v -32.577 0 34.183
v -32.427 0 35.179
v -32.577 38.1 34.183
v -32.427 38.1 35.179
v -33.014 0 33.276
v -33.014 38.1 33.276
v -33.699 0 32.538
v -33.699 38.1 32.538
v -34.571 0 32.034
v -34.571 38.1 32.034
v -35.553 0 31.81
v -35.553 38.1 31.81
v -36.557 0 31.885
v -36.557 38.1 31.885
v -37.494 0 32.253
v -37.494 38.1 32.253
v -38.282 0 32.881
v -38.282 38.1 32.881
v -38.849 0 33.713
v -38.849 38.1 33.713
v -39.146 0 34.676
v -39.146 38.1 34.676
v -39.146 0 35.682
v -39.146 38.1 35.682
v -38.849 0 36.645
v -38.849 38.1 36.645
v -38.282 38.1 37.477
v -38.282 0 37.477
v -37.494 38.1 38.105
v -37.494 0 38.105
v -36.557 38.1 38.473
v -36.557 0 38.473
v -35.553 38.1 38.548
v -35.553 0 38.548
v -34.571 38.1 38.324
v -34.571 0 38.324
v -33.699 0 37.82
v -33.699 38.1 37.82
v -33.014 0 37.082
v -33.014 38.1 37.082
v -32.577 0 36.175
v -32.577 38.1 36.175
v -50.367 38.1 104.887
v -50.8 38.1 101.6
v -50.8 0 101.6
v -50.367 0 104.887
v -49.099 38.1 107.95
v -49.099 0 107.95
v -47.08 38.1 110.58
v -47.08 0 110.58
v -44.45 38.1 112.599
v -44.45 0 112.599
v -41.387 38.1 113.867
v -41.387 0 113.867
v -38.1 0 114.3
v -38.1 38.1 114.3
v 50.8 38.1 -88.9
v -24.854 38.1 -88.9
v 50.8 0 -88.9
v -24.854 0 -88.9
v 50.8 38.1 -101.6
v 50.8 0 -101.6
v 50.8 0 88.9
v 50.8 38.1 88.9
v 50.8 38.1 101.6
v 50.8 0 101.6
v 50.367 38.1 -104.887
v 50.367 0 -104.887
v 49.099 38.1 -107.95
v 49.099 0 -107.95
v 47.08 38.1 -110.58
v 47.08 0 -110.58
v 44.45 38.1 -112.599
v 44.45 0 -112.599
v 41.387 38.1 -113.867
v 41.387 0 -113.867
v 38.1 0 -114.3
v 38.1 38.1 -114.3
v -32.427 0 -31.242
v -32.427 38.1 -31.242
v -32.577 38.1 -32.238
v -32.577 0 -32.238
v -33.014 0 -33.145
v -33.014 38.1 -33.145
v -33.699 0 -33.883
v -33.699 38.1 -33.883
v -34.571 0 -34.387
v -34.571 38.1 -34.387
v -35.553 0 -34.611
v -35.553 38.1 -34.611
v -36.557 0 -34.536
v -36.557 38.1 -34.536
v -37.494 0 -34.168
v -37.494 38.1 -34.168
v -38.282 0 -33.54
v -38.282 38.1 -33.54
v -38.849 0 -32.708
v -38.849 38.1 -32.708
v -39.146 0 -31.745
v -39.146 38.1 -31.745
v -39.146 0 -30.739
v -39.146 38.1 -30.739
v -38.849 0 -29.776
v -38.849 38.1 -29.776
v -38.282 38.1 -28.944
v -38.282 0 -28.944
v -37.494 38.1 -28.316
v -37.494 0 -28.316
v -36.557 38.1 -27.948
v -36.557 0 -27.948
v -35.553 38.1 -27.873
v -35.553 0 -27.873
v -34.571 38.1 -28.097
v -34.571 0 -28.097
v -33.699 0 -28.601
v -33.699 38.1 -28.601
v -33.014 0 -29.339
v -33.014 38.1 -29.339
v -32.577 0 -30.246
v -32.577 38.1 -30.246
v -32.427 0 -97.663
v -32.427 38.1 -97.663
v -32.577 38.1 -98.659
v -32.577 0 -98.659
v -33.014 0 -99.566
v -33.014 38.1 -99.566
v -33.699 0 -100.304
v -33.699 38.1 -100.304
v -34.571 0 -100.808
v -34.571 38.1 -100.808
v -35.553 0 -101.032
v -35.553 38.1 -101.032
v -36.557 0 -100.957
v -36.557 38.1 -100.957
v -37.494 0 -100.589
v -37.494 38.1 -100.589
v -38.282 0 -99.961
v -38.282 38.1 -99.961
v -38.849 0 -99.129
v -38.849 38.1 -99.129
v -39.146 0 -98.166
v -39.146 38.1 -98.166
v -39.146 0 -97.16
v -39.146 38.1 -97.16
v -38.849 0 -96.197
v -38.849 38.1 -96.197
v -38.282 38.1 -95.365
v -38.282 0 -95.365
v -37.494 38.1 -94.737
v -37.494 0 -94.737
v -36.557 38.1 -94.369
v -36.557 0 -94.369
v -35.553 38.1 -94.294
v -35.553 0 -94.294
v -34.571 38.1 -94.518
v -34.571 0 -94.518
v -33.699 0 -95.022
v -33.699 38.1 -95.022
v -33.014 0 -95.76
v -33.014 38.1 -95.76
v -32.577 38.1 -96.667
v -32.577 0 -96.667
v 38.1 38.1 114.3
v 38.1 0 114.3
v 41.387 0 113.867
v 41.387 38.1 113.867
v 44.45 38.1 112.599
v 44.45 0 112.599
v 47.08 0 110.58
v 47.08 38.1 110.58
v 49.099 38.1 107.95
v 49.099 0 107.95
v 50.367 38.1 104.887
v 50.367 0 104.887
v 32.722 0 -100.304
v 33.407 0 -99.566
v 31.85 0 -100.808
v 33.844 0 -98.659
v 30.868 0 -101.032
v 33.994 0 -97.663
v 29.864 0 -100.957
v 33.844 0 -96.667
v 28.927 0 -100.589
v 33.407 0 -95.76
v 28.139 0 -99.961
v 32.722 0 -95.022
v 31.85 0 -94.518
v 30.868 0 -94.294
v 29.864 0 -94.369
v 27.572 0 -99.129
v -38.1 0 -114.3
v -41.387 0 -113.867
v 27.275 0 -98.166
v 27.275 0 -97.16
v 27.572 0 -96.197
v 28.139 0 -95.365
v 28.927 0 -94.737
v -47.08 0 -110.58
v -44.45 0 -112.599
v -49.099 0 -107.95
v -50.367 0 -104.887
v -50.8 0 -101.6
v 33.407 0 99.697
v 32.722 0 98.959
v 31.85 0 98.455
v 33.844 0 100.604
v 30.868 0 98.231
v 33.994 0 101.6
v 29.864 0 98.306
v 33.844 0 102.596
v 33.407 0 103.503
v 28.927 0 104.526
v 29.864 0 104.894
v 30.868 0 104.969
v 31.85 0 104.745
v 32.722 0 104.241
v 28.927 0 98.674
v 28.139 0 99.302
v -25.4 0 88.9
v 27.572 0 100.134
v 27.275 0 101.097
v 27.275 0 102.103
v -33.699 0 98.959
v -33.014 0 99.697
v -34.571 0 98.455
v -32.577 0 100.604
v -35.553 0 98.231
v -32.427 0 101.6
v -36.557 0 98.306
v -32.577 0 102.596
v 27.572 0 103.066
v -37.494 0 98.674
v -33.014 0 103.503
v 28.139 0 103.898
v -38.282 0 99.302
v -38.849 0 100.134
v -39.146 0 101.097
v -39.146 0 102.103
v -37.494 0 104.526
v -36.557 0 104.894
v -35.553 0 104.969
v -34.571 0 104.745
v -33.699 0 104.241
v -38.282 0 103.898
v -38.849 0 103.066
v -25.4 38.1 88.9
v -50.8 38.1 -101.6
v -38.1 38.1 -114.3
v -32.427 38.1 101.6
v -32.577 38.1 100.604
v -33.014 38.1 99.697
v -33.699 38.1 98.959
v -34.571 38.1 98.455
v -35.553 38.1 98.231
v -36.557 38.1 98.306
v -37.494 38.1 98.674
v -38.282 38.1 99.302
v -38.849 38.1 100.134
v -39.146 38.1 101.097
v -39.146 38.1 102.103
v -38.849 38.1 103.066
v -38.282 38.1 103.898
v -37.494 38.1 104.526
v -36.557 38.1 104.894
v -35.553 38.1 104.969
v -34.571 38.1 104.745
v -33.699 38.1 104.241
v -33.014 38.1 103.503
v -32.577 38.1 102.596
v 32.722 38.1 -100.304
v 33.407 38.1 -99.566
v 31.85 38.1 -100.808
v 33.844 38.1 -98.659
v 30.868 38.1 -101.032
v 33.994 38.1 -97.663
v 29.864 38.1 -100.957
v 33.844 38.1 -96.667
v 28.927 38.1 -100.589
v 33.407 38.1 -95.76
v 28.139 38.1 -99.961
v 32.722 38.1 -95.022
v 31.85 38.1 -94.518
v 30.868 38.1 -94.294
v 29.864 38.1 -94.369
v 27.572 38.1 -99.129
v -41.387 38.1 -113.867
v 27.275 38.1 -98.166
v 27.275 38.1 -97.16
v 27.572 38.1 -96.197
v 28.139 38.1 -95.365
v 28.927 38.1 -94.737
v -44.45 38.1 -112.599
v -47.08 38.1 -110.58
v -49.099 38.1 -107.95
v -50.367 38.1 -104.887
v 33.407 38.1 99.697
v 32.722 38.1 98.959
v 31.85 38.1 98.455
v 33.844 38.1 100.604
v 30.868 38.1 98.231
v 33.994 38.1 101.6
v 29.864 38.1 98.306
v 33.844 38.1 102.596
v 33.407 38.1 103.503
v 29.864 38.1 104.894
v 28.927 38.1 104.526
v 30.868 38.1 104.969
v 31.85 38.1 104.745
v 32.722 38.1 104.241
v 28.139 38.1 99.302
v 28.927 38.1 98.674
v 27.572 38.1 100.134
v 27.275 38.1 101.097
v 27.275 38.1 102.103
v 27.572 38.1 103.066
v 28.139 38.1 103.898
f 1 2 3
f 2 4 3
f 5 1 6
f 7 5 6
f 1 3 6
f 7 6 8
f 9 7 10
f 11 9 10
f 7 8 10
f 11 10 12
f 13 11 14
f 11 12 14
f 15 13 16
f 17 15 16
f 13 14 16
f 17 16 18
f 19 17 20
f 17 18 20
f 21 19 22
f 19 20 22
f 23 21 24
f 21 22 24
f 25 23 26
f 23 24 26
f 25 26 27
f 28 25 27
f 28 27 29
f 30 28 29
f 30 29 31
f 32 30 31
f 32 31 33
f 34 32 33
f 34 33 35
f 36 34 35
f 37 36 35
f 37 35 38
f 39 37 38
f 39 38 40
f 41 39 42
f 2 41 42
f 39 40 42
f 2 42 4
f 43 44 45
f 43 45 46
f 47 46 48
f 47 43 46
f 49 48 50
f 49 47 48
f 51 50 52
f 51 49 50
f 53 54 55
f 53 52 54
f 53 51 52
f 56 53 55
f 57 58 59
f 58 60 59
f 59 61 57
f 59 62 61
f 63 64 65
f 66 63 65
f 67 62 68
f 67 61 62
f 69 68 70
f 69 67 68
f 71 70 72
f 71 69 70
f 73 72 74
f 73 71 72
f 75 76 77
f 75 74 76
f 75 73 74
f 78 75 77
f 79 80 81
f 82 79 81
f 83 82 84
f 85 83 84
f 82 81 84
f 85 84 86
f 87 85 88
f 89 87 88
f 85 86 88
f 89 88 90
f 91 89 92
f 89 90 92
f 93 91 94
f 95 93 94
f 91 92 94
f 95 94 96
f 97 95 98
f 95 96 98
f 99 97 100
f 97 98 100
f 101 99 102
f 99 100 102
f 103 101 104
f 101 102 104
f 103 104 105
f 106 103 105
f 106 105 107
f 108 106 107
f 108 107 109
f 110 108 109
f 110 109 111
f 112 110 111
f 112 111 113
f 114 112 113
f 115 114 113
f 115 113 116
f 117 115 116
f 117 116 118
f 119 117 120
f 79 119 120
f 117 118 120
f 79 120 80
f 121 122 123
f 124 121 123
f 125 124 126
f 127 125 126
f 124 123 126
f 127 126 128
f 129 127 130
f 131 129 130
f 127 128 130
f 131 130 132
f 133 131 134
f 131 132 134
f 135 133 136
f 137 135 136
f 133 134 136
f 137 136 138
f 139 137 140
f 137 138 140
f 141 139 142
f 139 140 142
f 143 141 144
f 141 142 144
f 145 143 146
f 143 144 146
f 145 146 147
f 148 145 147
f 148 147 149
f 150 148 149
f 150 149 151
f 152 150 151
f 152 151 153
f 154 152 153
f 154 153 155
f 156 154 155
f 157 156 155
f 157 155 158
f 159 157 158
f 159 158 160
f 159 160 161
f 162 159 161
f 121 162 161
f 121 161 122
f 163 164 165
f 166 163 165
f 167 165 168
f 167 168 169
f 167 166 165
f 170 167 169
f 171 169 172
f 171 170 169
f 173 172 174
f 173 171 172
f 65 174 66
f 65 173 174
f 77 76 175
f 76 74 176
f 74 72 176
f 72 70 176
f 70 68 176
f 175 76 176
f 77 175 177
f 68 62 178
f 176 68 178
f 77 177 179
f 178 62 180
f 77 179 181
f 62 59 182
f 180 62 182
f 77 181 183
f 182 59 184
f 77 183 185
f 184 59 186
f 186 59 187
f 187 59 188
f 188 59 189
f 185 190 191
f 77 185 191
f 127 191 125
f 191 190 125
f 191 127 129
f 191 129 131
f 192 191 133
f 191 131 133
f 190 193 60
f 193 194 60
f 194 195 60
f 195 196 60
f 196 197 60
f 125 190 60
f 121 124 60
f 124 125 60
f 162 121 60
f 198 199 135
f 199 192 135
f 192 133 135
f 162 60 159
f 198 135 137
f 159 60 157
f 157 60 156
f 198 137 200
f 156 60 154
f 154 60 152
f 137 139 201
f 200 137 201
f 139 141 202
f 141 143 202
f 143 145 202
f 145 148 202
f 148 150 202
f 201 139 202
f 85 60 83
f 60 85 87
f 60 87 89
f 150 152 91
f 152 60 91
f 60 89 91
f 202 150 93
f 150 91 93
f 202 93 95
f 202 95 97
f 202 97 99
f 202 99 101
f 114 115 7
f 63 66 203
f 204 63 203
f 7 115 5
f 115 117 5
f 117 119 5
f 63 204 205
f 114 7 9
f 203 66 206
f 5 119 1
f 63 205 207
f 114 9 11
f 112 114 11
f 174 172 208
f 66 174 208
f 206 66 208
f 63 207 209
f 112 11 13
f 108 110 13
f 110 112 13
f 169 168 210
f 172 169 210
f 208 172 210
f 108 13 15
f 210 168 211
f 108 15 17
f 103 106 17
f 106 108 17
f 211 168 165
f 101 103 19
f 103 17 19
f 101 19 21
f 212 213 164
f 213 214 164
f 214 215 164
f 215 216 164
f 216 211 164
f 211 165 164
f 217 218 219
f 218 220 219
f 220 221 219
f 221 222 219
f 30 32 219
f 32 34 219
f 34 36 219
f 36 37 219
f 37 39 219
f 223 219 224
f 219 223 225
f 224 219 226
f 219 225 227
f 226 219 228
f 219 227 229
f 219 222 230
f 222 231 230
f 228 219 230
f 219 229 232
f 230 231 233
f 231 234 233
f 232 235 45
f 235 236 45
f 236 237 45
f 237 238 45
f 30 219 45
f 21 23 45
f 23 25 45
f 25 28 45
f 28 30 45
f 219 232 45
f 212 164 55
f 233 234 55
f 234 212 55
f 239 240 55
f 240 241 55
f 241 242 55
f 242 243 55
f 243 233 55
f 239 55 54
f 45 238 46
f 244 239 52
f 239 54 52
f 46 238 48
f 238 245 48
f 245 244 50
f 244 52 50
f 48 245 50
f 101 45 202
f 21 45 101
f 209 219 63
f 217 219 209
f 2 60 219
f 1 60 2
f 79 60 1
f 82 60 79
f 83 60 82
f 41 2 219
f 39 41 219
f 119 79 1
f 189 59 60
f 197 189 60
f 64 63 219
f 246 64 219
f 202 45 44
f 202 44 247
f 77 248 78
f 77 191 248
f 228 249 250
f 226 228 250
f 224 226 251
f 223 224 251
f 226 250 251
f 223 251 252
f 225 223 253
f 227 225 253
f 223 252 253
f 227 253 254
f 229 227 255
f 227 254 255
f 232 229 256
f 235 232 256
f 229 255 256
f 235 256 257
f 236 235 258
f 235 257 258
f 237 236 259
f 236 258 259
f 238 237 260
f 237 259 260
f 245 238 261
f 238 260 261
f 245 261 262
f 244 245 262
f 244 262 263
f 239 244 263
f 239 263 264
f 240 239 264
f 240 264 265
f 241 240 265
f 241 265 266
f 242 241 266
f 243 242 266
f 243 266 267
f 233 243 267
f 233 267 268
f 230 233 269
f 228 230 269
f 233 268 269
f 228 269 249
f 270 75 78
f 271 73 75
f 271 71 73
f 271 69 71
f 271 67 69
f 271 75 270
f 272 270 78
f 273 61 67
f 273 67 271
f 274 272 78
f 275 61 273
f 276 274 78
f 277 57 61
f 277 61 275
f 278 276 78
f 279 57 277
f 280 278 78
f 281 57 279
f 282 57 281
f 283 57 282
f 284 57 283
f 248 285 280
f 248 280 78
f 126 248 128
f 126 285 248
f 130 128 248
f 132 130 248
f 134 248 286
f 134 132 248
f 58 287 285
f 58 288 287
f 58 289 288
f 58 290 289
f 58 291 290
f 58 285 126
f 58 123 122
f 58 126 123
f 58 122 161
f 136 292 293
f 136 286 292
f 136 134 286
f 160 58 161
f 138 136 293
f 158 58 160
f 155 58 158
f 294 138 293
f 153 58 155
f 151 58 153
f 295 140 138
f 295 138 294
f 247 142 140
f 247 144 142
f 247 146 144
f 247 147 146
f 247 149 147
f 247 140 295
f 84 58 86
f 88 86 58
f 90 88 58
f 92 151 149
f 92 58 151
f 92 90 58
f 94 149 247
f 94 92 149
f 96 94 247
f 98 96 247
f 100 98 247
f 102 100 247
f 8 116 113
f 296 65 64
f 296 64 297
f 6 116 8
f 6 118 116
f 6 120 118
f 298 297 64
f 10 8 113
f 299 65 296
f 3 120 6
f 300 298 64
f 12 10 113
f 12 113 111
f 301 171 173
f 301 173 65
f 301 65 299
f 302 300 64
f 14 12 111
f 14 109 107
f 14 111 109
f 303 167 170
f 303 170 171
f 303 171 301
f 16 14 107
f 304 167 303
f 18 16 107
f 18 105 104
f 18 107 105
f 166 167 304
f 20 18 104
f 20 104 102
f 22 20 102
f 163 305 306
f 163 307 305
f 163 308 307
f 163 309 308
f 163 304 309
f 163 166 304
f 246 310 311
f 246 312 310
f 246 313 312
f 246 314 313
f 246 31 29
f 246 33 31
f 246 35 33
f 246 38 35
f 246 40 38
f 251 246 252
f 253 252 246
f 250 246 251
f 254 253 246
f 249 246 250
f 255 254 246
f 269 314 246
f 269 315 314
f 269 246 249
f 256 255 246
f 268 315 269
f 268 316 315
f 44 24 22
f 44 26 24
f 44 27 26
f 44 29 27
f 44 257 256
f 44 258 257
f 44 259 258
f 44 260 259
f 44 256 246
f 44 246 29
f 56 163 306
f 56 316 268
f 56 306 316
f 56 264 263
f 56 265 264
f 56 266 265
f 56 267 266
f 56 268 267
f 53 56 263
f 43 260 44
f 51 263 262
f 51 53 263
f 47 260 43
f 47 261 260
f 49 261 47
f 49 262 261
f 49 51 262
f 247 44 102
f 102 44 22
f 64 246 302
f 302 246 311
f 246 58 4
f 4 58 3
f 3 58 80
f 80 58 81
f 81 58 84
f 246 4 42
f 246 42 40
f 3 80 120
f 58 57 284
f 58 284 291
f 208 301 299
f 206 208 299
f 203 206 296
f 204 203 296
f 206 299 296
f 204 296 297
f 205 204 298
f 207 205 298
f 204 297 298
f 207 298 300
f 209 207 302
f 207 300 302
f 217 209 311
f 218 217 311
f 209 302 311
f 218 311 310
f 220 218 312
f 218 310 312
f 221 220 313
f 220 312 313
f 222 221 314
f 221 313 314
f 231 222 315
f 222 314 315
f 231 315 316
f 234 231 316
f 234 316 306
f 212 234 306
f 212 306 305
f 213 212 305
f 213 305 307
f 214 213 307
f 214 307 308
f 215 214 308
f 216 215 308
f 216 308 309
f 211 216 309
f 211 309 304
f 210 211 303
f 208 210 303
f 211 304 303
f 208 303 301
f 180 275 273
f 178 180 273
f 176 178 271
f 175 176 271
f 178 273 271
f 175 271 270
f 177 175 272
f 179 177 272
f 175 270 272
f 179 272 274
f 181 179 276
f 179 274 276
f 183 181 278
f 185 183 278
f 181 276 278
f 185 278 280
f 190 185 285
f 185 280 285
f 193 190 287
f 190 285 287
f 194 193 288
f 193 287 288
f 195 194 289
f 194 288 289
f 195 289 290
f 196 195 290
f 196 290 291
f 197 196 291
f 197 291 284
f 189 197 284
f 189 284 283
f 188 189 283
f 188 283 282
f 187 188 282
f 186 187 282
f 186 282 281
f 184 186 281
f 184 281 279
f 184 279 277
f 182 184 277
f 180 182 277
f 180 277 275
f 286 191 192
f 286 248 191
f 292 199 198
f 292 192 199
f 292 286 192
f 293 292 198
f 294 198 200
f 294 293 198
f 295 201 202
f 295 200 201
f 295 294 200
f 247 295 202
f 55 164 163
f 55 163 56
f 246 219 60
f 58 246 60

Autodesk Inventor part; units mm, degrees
ref_plane "YZ Plane" through (0, 0, 0) normal (1, 0, 0) x (0, 1, 0)
ref_plane "XZ Plane" through (0, 0, 0) normal (0, 1, 0) x (-1, 0, 0)
ref_plane "XY Plane" through (0, 0, 0) normal (0, 0, 1) x (1, 0, 0)
sketch "Sketch1" plane through (0, 0, 0) normal (0, 1, 0) x (-1, 0, 0)
  line L0 (-50.8, 114.3) -> (50.8, 114.3)
  line L1 (50.8, 114.3) -> (50.8, -114.3)
  line L2 (50.8, -114.3) -> (-50.8, -114.3)
  line L3 (-50.8, -114.3) -> (-50.8, 114.3)
  line L4 (-50.8, 114.3) -> (50.8, -114.3) construction
  line L5 (50.8, 114.3) -> (-50.8, -114.3) construction
  line L6 (-50.8, 88.9) -> (25.4, 88.9)
  line L7 (25.4, 88.9) -> (24.8543, -88.9)
  line L8 (24.8543, -88.9) -> (-50.8, -88.9)
  point P0 (0, 0)
  dimension "d0" = 101.6
  dimension "d1" = 228.6
  dimension "d2" = 76.2
  dimension "d3" = 25.4
  dimension "d4" = 25.4
extrude "Extrusion1" add sketch "Sketch1" along normal blind 38.1 contours L0 L1 L2 L3 L8 L7 L6
fillet "Fillet1" radius 12.7 4 edges at (50.8, 19.05, 114.3) (-50.8, 19.05, 114.3) (-50.8, 19.05, -114.3) (50.8, 19.05, -114.3)
sketch "Sketch2" plane through (0, 38.1, 0) normal (0, 1, 0) x (1, 0, 0)
  line L0 (-38.1, -114.3) -> (38.1, -114.3) projected
  circle A0 centre (-35.8052, -101.6) radius 3.3782
  line L1 (-35.8052, -101.6) -> (-35.8052, 101.6) construction
  line L2 (-35.8052, -101.6) -> (40.3948, -101.6) construction
  line L3 (-35.8052, 101.6) -> (40.3948, 101.6) construction
  circle A1 centre (-35.8052, -88.3158) radius 3.3782 construction
  line L4 (-39.1834, -98.2218) -> (-30.0963, -98.2218) construction
  circle A2 centre (-35.8052, -75.0316) radius 3.3782 construction
  circle A3 centre (-35.8052, -61.7474) radius 3.3782 construction
  circle A4 centre (-35.8052, -48.4632) radius 3.3782 construction
  circle A5 centre (-35.8052, -35.179) radius 3.3782 construction
  circle A6 centre (-35.8052, -21.8948) radius 3.3782 construction
  circle A7 centre (-35.8052, -8.6106) radius 3.3782 construction
  circle A8 centre (-35.8052, 4.6736) radius 3.3782 construction
  circle A9 centre (-35.8052, 17.9578) radius 3.3782 construction
  circle A10 centre (-35.8052, 31.242) radius 3.3782 construction
  circle A11 centre (-35.8052, 44.5262) radius 3.3782 construction
  circle A12 centre (-35.8052, 57.8104) radius 3.3782 construction
  circle A13 centre (-35.8052, 71.0946) radius 3.3782 construction
  circle A14 centre (-35.8052, 84.3788) radius 3.3782 construction
  circle A15 centre (-35.8052, 97.663) radius 3.3782 construction
  circle A16 centre (-22.521, -101.6) radius 3.3782 construction
  circle A17 centre (-9.2368, -101.6) radius 3.3782 construction
  circle A18 centre (4.0474, -101.6) radius 3.3782 construction
  circle A19 centre (17.3316, -101.6) radius 3.3782 construction
  circle A20 centre (30.6158, -101.6) radius 3.3782 construction
  circle A21 centre (43.9, -101.6) radius 3.3782 construction
  circle A22 centre (30.6158, 97.663) radius 3.3782 construction
  circle A23 centre (30.6158, -101.6) radius 3.3782 construction
  circle A24 centre (-35.8052, 97.663) radius 3.3782 construction
  circle A25 centre (-35.8052, 31.242) radius 3.3782 construction
  circle A26 centre (-35.8052, -35.179) radius 3.3782 construction
  circle A27 centre (-35.8052, -35.179) radius 3.3782
  circle A28 centre (-35.8052, 31.242) radius 3.3782
  circle A29 centre (-35.8052, 97.663) radius 3.3782
  circle A30 centre (30.6158, 97.663) radius 3.3782
  circle A31 centre (30.6158, -101.6) radius 3.3782
  point P0 (0, 0)
  point P1 (-35.8052, -25.4)
  point P2 (-35.8052, 25.4)
  dimension "d8" = 12.7
  dimension "d9" = 76.2
  dimension "d10" = 127
  dimension "d11" = 203.2
  dimension "d12" = 76.2
  dimension "d13" = 6.7564
  dimension "d22" = 13.2842
  dimension "d25" = 13.2842
  dimension "d30" = 13.2842
  dimension "d33" = 13.2842
  dimension "d38" = 6.7564
  dimension "d39" = 6.7564
  dimension "d40" = 6.7564
  dimension "d41" = 6.7564
  dimension "d42" = 6.7564
  dimension "d43" = 6.7564
  dimension "d44" = 6.7564
  dimension "d45" = 6.7564
  dimension "d46" = 6.7564
extrude "Extrusion4" cut sketch "Sketch2" against normal through all
equation "\"d25\" = d22"
equation "\"d30\" = d22"
equation "\"d33\" = d22"
properties part number "FINALBH"
